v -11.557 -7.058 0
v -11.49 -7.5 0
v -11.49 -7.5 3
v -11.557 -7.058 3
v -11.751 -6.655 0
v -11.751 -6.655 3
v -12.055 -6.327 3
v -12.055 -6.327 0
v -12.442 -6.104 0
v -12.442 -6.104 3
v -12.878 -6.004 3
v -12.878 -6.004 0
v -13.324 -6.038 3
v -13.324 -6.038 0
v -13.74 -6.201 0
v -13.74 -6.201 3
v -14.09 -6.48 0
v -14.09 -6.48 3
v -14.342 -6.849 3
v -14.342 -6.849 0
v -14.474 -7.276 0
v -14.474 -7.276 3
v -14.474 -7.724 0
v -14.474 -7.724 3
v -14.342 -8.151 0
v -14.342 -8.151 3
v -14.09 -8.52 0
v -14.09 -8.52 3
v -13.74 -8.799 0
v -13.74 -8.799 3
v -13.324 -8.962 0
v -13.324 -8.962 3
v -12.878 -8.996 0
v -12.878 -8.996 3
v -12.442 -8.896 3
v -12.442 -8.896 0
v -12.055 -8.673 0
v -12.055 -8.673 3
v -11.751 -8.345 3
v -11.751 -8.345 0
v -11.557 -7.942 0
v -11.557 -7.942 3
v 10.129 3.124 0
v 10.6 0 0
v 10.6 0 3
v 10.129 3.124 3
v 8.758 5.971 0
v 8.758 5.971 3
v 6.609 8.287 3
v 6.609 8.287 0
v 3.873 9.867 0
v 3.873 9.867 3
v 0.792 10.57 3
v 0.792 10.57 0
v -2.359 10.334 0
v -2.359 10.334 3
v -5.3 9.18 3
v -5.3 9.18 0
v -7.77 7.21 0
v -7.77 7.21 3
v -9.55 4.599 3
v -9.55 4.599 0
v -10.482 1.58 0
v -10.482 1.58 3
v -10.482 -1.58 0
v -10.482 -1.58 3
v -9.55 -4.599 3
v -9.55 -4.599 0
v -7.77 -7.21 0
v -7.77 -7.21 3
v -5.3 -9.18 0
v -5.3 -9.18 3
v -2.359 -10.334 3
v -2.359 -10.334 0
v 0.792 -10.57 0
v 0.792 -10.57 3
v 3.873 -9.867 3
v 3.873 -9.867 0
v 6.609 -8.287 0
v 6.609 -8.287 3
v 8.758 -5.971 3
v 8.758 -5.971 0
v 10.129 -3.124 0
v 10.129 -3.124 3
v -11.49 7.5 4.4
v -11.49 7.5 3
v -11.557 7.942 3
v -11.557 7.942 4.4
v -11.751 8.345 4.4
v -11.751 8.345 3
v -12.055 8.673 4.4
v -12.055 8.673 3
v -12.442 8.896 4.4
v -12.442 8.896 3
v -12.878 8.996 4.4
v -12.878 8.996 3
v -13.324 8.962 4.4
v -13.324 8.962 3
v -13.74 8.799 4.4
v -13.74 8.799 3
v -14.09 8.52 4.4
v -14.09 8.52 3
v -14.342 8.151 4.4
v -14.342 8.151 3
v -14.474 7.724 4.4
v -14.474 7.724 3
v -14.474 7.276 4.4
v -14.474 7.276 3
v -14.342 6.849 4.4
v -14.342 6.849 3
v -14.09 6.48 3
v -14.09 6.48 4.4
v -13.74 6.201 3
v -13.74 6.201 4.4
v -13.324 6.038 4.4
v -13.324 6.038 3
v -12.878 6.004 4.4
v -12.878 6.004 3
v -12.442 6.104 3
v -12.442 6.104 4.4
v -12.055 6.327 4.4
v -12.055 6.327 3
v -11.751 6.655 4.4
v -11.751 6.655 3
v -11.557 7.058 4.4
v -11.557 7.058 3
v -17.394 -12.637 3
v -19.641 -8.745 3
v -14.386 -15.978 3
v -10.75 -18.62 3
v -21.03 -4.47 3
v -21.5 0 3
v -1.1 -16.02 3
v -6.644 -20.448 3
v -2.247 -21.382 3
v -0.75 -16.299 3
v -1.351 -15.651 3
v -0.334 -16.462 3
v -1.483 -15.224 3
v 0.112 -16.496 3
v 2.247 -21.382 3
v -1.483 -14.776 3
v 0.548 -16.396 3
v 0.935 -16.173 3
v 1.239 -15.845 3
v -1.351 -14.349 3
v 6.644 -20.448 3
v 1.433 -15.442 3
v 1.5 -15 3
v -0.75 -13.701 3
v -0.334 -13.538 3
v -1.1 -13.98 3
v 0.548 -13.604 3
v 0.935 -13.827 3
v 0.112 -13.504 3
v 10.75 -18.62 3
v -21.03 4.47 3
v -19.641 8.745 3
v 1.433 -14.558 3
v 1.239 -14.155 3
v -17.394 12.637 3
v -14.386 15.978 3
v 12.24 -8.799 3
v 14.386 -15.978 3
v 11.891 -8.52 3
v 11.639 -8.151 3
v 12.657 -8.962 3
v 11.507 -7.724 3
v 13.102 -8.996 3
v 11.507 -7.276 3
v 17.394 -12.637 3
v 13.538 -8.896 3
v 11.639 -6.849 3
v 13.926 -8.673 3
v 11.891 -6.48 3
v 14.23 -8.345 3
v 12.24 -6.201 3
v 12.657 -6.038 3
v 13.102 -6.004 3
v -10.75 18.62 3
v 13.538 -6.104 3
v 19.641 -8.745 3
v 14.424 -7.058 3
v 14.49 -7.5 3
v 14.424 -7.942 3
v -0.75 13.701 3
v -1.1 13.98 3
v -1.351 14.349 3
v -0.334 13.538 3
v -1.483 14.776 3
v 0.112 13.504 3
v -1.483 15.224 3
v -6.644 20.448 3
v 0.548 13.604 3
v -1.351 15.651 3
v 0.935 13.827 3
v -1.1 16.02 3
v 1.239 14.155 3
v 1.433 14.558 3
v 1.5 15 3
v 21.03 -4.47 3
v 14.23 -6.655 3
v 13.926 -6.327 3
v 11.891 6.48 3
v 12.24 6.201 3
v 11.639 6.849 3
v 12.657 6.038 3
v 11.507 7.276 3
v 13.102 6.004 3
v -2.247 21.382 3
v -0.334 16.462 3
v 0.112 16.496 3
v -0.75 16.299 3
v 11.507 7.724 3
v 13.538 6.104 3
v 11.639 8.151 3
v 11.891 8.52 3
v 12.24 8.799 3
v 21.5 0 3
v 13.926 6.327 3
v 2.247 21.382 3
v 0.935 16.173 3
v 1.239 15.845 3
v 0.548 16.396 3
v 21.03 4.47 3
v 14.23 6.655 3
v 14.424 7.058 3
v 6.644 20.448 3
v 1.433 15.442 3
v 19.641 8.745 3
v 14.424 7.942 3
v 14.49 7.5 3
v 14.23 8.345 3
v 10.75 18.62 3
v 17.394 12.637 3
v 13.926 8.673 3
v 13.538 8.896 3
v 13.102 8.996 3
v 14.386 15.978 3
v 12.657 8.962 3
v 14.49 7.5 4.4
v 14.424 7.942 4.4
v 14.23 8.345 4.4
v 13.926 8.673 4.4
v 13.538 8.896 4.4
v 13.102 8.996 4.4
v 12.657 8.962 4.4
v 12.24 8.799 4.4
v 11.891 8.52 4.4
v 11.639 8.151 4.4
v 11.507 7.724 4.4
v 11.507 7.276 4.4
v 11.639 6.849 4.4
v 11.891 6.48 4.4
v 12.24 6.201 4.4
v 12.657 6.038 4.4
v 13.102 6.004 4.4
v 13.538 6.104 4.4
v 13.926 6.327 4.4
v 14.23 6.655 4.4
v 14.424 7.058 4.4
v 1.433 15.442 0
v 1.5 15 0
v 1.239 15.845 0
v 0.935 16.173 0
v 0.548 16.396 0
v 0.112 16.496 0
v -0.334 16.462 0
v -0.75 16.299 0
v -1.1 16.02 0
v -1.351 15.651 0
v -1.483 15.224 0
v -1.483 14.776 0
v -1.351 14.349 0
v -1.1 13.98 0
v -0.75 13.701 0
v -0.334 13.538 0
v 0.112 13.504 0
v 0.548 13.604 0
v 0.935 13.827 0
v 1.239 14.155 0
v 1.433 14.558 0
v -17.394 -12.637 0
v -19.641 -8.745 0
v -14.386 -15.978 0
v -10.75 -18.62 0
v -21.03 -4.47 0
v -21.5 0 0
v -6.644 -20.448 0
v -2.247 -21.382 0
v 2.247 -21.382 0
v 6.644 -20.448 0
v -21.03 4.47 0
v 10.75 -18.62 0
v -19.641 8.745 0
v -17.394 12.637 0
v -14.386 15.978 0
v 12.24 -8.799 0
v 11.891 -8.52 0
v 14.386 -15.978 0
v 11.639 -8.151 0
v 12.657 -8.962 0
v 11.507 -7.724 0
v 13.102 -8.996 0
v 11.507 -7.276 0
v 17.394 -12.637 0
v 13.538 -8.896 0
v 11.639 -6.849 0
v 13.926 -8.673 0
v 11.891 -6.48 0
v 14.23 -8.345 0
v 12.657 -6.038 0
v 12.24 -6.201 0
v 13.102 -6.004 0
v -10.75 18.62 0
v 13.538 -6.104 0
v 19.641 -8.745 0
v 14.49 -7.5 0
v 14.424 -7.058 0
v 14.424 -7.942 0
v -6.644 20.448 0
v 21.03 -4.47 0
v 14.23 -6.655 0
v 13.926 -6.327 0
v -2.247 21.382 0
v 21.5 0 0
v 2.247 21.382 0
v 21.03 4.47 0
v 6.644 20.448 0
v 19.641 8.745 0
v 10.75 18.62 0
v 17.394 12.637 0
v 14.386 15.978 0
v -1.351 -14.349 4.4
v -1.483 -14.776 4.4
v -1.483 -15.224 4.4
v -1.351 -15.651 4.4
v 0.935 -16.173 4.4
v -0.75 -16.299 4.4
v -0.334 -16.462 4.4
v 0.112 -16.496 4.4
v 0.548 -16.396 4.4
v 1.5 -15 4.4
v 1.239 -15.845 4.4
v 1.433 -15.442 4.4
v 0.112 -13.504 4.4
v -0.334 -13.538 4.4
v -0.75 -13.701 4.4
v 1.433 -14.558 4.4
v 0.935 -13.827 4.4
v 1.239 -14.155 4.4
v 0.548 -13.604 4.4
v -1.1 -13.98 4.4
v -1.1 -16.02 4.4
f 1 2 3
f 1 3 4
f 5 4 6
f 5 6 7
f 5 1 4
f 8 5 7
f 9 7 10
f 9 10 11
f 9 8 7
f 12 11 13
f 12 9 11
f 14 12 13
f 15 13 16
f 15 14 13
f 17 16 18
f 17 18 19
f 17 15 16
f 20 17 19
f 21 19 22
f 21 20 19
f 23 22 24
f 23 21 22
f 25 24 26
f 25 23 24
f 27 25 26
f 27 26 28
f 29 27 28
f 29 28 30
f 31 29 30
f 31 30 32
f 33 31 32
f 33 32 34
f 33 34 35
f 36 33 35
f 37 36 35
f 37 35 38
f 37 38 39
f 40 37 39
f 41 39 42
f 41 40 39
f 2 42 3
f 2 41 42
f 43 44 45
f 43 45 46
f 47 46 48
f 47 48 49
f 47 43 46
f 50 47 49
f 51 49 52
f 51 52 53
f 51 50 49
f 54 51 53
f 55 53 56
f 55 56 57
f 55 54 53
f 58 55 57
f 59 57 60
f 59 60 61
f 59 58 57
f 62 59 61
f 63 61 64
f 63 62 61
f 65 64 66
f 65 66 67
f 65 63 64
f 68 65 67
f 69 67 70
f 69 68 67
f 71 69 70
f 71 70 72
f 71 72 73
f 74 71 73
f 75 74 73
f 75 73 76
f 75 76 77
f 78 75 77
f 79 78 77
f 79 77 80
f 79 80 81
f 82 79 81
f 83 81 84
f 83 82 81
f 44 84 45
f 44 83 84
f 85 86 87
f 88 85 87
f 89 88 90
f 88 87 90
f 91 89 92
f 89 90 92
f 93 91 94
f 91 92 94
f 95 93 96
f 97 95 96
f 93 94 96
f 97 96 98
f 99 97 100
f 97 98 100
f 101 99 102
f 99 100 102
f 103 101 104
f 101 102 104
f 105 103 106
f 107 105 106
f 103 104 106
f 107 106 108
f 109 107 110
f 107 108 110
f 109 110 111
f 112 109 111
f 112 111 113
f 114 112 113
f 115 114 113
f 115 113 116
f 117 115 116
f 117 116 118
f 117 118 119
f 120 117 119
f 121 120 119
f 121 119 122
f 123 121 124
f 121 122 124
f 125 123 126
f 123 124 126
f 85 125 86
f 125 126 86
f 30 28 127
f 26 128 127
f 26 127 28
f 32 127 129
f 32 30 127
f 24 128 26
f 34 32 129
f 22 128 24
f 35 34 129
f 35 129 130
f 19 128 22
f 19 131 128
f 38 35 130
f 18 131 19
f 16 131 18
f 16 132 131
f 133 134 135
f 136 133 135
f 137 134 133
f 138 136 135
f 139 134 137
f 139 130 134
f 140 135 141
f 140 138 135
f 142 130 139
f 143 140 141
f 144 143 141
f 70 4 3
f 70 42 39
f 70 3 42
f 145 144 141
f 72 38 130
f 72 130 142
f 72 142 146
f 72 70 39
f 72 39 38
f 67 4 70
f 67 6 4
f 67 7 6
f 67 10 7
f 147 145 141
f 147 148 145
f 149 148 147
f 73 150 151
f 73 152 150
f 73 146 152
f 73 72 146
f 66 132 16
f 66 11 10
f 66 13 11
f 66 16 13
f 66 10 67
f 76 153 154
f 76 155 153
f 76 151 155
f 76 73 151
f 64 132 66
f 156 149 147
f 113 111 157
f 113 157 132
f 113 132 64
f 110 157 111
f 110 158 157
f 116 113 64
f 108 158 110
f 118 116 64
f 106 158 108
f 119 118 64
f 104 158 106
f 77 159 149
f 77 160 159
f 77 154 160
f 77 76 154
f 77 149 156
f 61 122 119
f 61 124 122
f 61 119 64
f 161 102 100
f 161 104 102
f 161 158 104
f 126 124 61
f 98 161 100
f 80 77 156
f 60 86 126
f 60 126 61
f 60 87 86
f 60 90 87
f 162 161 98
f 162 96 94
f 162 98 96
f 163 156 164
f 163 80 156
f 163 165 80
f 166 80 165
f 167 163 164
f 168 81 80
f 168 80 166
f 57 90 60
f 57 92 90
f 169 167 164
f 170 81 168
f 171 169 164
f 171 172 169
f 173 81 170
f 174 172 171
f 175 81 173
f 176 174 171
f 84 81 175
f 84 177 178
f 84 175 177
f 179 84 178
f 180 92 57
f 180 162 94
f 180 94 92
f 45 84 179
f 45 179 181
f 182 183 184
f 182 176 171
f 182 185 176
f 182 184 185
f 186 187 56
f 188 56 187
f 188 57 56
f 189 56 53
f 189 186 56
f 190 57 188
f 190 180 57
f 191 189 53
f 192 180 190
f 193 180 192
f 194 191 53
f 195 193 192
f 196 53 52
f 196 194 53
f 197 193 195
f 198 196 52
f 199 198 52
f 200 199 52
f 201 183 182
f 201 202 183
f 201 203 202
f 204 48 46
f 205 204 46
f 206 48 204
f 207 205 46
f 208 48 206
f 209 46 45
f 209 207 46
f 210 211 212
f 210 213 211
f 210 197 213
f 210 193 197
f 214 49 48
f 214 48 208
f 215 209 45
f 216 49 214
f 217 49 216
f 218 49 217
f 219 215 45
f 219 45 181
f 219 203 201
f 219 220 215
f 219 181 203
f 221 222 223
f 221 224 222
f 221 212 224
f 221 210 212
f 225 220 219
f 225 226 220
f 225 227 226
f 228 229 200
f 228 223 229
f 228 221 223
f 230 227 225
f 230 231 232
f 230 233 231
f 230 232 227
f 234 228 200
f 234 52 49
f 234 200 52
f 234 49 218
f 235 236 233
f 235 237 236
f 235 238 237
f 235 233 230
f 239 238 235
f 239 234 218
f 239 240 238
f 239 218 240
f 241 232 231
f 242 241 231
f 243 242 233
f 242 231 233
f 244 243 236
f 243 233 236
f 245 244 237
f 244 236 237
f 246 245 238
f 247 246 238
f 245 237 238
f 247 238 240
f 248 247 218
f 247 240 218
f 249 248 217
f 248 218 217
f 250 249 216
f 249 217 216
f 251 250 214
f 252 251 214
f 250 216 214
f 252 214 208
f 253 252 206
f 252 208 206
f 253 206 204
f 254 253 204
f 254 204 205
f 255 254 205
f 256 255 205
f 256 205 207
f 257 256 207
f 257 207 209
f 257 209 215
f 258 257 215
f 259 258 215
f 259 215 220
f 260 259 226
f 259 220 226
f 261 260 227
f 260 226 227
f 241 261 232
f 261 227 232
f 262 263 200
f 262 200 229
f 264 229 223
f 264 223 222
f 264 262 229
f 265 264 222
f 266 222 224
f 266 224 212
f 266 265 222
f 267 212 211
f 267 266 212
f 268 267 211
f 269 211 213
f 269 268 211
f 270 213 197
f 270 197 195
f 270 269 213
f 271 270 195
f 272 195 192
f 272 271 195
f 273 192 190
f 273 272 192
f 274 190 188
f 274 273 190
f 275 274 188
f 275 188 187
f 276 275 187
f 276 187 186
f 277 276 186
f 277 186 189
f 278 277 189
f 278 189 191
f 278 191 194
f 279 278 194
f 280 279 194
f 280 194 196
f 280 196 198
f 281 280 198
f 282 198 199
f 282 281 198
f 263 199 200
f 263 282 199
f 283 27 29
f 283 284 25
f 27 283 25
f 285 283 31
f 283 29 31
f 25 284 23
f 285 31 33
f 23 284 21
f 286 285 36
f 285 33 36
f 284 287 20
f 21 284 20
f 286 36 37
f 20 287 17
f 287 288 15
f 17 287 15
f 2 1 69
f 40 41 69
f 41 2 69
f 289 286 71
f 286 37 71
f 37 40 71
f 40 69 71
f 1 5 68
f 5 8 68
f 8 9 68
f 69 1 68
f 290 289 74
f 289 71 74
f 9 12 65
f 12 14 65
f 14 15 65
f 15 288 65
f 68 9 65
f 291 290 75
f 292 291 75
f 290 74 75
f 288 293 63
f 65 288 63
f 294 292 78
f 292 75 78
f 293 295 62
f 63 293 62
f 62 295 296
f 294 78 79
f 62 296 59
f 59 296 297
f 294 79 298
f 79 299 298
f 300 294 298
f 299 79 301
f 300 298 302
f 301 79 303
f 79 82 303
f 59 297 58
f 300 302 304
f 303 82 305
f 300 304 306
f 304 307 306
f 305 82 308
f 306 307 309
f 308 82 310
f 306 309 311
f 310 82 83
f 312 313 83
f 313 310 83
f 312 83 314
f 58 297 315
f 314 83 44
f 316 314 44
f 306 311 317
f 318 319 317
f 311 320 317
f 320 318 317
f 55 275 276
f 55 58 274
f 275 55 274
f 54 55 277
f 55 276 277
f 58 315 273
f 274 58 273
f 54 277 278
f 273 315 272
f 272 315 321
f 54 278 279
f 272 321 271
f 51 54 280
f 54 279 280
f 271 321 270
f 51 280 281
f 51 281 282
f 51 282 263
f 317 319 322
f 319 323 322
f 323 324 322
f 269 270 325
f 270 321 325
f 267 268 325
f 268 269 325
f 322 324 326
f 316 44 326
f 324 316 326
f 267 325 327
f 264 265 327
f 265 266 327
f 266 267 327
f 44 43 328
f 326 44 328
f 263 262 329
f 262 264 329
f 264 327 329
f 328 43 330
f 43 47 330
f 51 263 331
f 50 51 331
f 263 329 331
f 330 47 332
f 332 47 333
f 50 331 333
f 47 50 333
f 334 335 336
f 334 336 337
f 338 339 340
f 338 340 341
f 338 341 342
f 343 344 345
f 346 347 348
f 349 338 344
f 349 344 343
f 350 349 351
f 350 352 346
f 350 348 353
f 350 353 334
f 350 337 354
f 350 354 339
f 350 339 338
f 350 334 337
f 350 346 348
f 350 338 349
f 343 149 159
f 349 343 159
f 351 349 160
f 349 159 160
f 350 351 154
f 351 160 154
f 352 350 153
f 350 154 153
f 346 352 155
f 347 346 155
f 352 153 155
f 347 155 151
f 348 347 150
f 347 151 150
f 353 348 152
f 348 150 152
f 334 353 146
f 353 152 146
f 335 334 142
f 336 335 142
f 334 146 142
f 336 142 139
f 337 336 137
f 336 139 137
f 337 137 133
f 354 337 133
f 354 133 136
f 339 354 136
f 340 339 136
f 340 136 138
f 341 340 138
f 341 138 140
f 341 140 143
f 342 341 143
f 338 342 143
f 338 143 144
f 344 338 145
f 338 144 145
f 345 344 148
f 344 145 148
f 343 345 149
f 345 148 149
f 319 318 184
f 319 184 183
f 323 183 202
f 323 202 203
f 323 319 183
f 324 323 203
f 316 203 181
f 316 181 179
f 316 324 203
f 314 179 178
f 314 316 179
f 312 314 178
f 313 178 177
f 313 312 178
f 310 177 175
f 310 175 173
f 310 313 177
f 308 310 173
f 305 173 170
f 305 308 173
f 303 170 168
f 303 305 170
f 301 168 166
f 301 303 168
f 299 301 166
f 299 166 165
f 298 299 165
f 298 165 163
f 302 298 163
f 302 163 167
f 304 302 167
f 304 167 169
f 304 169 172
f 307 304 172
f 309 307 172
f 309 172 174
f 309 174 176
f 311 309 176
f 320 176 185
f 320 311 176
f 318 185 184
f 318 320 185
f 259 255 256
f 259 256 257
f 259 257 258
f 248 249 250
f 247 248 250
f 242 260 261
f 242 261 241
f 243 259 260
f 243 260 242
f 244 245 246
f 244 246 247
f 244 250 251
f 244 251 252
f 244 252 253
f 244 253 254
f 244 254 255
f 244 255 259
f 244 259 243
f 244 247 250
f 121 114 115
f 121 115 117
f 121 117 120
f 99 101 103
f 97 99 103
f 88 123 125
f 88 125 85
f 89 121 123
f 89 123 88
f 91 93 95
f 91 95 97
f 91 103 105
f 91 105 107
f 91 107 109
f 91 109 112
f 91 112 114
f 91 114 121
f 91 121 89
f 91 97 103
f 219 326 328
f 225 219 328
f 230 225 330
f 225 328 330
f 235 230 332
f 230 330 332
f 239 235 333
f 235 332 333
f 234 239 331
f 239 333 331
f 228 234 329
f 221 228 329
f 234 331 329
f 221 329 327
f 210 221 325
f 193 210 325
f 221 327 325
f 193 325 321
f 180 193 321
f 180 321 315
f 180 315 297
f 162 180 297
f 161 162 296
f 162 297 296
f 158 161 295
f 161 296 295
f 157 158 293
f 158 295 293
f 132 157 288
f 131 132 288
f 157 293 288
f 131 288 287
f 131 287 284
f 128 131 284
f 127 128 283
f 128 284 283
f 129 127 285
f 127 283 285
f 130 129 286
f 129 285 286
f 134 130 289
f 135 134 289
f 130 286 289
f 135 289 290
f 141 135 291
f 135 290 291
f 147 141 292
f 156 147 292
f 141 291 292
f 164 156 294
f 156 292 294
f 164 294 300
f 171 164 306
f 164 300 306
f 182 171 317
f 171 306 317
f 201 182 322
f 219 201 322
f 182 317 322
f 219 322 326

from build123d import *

# Parameters (mm, degrees)
SKETCH_1_R      = 21.5
SKETCH_1_R_2    = 10.6
SKETCH_1_R_3    = 1.5
EXTRUDE_1_DEPTH = 3
SKETCH_2_R      = 1.5
EXTRUDE_2_DEPTH = 1.4


with BuildPart() as part:
    # 草圖1 → 填料-伸長1 (new body)
    with BuildSketch(Plane.XY):
        Circle(SKETCH_1_R)
        Circle(SKETCH_1_R_2, mode=Mode.SUBTRACT)
        with Locations((0, 15)):
            Circle(SKETCH_1_R_3, mode=Mode.SUBTRACT)
        with Locations((12.990381057, -7.5)):
            Circle(SKETCH_1_R_3, mode=Mode.SUBTRACT)
        with Locations((-12.990381057, -7.5)):
            Circle(SKETCH_1_R_3, mode=Mode.SUBTRACT)
    extrude(amount=EXTRUDE_1_DEPTH)

    # 草圖2 → 填料-伸長2 (add)
    with BuildSketch(Plane.XY.offset(3)):
        with Locations((12.990381057, 7.5)):
            Circle(SKETCH_2_R)
        with Locations((-12.990381057, 7.5)):
            Circle(SKETCH_2_R)
        with Locations((0, -15)):
            Circle(SKETCH_2_R)
    extrude(amount=EXTRUDE_2_DEPTH)


solid = part.part
